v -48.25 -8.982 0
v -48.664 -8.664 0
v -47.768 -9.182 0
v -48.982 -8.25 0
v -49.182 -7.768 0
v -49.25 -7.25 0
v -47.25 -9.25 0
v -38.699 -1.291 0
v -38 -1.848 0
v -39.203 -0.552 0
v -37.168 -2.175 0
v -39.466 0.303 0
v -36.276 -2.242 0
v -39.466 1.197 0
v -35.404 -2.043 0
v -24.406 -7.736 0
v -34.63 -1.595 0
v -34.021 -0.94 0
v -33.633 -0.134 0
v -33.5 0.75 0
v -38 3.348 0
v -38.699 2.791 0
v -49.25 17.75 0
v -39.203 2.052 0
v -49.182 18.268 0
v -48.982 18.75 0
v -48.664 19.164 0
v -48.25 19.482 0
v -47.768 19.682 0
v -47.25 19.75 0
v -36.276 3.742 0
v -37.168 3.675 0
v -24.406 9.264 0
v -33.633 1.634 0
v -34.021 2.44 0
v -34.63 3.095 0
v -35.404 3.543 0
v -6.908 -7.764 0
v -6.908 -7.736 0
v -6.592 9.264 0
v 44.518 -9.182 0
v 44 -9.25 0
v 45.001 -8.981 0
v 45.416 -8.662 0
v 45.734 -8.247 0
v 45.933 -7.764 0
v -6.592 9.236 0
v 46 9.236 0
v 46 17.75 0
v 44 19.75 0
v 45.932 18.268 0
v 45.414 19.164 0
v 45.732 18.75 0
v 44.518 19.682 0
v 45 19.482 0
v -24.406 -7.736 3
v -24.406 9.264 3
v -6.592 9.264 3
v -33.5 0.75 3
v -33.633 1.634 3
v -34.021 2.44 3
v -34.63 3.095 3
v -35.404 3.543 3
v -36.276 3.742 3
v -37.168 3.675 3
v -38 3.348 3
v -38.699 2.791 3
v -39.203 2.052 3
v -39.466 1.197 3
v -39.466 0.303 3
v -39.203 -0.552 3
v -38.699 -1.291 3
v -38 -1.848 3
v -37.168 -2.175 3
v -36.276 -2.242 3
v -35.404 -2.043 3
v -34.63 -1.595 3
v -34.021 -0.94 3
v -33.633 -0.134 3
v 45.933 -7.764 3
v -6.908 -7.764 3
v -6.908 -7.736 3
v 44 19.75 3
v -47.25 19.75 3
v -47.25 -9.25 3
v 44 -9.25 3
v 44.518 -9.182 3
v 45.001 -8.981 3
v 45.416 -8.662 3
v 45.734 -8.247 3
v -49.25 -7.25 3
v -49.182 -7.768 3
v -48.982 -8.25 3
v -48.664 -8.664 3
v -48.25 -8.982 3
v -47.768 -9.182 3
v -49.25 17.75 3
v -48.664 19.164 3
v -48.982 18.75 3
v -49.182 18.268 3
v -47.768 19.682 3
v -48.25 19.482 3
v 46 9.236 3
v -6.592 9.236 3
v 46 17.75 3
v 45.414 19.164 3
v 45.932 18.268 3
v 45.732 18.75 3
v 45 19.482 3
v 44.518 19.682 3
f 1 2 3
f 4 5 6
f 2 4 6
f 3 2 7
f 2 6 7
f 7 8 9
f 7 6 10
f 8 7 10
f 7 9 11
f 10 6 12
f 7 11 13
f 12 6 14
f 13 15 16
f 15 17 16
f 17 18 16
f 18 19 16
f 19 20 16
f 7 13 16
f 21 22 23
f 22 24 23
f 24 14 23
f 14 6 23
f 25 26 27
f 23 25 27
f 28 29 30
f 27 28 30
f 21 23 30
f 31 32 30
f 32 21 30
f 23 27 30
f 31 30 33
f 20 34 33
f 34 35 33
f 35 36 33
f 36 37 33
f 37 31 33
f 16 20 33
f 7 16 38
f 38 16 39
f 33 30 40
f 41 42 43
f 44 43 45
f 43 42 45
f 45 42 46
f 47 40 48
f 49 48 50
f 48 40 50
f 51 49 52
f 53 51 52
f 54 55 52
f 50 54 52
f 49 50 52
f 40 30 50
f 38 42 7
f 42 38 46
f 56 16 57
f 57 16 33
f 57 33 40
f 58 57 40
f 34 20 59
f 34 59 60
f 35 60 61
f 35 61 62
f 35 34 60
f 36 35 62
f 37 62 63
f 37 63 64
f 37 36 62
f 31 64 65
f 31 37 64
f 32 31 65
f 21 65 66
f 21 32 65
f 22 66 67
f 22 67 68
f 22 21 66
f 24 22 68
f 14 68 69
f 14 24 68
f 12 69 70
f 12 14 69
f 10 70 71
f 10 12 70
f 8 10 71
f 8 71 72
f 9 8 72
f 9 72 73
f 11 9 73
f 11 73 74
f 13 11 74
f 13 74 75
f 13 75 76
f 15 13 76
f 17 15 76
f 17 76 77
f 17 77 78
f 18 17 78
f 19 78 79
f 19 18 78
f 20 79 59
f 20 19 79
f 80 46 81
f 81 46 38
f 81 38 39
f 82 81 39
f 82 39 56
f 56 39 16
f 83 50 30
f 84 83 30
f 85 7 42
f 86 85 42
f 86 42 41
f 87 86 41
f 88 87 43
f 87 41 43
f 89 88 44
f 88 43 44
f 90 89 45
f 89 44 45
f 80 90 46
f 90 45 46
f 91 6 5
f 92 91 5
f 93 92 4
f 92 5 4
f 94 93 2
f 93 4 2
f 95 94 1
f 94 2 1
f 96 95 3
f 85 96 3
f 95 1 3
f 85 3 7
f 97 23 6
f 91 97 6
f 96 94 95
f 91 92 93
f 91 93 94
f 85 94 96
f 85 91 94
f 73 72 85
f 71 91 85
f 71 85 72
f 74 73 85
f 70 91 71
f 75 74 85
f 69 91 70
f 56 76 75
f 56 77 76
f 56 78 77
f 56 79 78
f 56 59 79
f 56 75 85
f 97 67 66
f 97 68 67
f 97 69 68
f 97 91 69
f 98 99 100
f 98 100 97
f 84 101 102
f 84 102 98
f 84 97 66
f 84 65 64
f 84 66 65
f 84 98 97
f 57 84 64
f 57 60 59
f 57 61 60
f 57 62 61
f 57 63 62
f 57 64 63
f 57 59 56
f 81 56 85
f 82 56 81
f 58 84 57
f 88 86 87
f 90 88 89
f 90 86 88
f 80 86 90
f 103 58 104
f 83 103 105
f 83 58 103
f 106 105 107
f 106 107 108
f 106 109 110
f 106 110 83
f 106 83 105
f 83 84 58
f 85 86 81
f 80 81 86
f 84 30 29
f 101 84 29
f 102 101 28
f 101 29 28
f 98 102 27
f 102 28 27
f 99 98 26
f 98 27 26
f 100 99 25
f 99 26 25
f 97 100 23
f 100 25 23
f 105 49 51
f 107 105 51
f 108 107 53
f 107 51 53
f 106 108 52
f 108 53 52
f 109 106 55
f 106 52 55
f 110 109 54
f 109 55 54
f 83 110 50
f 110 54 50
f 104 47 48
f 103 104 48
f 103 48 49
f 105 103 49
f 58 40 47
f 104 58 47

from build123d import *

# Parameters (mm, degrees)
SKETCH1_R           = 3
BOSS_EXTRUDE1_DEPTH = 3


with BuildPart() as part:
    # Sketch1 → Boss-Extrude1 (new body)
    with BuildSketch(Plane.XY):
        with BuildLine():
            ThreePointArc((46, 17.75), (45.414213562, 19.164213562), (44, 19.75))
            Line((44, 19.75), (-47.25, 19.75))
            ThreePointArc((-47.25, 19.75), (-48.664213562, 19.164213562), (-49.25, 17.75))
            Line((-49.25, 17.75), (-49.25, -7.25))
            ThreePointArc((-49.25, -7.25), (-48.664213562, -8.664213562), (-47.25, -9.25))
            Line((-47.25, -9.25), (44, -9.25))
            ThreePointArc((44, -9.25), (45.219142744, -8.835462384), (45.932904961, -7.763690971))
            Line((45.932904961, -7.763690971), (45.906437474, -7.763690971))
            Line((45.906437474, -7.763690971), (28.406437474, -7.763690971))
            Line((28.406437474, -7.763690971), (28.092497309, -7.763690971))
            Line((28.092497309, -7.763690971), (10.906437474, -7.763690971))
            Line((10.906437474, -7.763690971), (10.592497309, -7.763690971))
            Line((10.592497309, -7.763690971), (-6.907502691, -7.763690971))
            Line((-6.907502691, -7.763690971), (-6.907502691, -7.736309029))
            Line((-6.907502691, -7.736309029), (-24.406437474, -7.736309029))
            Line((-24.406437474, -7.736309029), (-24.406437474, 9.263690971))
            Line((-24.406437474, 9.263690971), (-6.592497309, 9.263690971))
            Line((-6.592497309, 9.263690971), (-6.592497309, 9.236309029))
            Line((-6.592497309, 9.236309029), (10.592497309, 9.236309029))
            Line((10.592497309, 9.236309029), (10.906437474, 9.236309029))
            Line((10.906437474, 9.236309029), (28.092497309, 9.236309029))
            Line((28.092497309, 9.236309029), (28.406437474, 9.236309029))
            Line((28.406437474, 9.236309029), (45.906437474, 9.236309029))
            Line((45.906437474, 9.236309029), (46, 9.236309029))
            Line((46, 9.236309029), (46, 17.75))
        make_face()
        with Locations((-36.5, 0.75)):
            Circle(SKETCH1_R, mode=Mode.SUBTRACT)
    extrude(amount=BOSS_EXTRUDE1_DEPTH)


solid = part.part
